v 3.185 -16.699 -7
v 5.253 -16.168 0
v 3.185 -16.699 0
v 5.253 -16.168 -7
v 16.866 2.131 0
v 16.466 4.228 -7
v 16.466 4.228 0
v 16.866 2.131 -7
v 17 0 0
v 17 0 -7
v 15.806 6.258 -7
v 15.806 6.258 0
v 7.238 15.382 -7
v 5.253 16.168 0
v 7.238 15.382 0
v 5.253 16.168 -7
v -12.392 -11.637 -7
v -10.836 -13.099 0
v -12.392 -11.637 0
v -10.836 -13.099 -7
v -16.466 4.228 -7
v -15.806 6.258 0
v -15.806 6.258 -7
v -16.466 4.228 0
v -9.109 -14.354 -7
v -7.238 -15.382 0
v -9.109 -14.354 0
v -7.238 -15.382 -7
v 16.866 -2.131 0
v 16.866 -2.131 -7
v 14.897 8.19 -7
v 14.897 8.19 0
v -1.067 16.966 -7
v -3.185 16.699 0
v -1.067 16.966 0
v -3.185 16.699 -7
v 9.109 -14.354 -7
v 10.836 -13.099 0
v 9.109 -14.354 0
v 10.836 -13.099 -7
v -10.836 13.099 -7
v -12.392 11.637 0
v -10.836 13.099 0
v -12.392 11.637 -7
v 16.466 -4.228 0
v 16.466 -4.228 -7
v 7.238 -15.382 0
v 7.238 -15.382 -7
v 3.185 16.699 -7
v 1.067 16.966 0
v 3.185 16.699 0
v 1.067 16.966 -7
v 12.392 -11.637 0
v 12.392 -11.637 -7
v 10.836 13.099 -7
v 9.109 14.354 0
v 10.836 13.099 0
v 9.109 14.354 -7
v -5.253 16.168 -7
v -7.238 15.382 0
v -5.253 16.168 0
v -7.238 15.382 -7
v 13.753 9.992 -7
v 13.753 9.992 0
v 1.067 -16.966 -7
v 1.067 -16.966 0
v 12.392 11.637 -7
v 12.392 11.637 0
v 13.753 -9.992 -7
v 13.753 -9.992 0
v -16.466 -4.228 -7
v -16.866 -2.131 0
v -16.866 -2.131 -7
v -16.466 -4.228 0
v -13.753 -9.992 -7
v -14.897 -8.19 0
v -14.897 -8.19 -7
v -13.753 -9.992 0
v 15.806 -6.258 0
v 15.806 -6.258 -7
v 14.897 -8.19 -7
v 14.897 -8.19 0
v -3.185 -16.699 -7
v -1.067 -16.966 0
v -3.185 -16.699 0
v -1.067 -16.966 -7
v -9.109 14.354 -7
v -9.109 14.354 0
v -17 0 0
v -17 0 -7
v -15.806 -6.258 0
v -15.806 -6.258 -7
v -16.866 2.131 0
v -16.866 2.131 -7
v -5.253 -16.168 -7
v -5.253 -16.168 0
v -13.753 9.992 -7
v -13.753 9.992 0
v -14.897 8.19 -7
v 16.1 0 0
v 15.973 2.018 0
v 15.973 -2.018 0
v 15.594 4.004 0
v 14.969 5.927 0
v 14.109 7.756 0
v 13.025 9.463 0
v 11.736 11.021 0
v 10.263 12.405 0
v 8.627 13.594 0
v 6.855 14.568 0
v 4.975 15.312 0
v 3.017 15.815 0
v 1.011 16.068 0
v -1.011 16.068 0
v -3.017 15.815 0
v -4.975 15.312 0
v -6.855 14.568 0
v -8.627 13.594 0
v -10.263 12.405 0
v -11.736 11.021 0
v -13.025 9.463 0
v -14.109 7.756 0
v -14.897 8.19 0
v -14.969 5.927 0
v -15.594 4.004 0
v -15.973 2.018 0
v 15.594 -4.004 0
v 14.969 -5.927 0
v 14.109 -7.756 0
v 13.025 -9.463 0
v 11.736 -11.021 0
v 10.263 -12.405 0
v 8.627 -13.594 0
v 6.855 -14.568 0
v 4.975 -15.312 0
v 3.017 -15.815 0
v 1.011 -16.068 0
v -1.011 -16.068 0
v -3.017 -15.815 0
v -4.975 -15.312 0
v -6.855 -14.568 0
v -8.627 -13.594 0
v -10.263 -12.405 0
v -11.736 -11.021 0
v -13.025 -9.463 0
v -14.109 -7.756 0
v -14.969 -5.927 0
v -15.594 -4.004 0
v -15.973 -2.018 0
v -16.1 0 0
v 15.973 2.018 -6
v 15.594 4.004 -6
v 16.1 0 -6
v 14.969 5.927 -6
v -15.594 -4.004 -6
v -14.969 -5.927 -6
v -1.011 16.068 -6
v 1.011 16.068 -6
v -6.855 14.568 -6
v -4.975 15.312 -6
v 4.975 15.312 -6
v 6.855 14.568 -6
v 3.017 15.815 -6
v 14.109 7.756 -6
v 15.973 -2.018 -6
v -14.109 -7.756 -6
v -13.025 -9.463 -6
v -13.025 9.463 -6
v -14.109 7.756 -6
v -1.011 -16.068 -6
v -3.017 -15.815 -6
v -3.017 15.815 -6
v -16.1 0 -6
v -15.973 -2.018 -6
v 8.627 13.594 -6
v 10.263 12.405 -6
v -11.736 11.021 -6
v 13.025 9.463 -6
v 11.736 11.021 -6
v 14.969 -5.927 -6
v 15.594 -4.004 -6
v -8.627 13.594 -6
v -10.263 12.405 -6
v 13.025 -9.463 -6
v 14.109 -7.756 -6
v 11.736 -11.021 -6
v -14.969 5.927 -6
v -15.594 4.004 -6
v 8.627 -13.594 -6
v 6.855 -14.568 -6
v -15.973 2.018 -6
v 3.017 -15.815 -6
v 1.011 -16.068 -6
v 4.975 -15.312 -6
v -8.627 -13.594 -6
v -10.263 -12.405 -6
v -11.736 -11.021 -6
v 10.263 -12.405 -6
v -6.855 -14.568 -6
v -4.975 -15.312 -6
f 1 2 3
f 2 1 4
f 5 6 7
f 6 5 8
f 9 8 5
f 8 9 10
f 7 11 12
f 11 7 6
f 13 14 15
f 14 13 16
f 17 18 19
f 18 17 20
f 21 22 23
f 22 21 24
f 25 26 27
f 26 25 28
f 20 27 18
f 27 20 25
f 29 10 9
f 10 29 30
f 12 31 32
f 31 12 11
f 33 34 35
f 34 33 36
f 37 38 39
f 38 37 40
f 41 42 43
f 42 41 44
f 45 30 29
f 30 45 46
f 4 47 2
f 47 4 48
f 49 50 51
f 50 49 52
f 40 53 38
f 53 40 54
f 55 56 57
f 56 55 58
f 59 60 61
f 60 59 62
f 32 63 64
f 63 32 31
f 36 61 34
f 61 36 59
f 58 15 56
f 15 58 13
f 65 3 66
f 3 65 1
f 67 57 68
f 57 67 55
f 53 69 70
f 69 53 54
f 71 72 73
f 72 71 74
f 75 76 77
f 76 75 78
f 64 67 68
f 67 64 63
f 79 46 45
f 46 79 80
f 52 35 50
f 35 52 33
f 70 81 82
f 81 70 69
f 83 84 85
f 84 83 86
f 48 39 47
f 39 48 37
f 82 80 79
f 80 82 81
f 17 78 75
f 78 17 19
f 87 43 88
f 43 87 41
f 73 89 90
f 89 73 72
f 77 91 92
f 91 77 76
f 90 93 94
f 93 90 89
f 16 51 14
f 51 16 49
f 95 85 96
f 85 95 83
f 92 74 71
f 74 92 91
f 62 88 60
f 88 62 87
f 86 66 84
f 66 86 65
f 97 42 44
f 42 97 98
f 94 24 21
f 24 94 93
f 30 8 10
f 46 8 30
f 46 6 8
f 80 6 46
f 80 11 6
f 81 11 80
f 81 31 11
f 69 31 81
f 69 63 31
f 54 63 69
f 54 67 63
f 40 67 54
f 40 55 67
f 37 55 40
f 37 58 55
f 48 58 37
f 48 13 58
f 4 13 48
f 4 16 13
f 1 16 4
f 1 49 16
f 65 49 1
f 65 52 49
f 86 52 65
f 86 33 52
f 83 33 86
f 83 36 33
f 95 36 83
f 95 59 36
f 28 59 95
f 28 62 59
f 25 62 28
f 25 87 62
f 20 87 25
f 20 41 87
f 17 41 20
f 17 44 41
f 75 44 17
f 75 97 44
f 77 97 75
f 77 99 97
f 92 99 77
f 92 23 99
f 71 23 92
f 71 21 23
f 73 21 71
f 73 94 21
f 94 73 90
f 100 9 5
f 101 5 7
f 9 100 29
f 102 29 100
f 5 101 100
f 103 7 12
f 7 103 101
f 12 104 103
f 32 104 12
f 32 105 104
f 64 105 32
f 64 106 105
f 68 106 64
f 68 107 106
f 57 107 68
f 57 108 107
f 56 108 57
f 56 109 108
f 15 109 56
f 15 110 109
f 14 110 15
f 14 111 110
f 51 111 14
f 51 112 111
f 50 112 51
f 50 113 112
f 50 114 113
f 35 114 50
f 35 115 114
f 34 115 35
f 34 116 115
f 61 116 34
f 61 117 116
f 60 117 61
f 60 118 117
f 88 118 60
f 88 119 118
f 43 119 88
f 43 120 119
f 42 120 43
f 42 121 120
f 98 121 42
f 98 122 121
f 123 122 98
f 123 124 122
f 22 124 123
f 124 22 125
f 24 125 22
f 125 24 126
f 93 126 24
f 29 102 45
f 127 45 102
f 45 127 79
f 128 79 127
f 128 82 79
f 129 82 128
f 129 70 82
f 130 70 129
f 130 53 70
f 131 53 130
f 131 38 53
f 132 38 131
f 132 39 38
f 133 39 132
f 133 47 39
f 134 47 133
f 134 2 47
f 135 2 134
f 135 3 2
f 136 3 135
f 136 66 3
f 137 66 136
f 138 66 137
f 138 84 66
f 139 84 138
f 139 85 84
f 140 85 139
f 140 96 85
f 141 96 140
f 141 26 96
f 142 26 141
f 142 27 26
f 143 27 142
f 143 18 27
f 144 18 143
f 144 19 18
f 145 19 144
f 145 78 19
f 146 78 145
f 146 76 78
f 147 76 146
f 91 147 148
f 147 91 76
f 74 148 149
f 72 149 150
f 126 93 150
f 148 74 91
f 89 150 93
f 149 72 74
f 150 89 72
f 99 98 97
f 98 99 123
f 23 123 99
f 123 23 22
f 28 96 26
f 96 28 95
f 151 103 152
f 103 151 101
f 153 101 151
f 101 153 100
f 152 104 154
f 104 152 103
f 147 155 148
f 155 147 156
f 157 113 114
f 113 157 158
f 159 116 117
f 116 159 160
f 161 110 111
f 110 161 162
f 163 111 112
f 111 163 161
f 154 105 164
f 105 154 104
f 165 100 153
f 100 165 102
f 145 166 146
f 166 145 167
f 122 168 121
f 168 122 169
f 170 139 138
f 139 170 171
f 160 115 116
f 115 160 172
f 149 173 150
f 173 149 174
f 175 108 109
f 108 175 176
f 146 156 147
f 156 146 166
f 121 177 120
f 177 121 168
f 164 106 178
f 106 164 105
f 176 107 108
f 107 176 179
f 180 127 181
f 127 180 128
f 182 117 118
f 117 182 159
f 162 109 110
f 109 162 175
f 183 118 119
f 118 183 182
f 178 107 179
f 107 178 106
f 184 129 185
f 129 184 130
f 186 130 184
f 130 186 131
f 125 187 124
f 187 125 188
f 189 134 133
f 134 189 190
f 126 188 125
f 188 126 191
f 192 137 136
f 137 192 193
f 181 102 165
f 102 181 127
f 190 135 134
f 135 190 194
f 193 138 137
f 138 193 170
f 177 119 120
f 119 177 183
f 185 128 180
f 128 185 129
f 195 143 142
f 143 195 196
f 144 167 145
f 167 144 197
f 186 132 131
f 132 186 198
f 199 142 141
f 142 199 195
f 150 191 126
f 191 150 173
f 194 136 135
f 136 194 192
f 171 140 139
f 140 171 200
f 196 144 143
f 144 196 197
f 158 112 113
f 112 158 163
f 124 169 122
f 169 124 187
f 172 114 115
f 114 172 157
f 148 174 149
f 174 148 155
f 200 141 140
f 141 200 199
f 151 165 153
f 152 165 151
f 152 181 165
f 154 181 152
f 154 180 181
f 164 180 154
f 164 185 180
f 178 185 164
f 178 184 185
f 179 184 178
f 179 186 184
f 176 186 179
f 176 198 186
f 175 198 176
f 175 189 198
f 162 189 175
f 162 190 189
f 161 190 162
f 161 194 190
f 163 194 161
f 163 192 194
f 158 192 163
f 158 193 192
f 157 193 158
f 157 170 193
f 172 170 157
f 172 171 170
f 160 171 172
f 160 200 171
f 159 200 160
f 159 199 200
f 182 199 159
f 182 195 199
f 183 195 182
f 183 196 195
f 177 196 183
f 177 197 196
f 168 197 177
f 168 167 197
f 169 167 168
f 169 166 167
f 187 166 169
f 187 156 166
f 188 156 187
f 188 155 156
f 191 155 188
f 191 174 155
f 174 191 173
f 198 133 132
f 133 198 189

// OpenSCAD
$fn = 50;


difference() {
	union() {
		translate(v = [0, 0, -7.0000000000]) {
			cylinder(h = 7, r = 17.0000000000);
		}
	}
	union() {
		#translate(v = [0, 0, -6.0000000000]) {
			cylinder(h = 6, r = 16.1000000000);
		}
	}
}
